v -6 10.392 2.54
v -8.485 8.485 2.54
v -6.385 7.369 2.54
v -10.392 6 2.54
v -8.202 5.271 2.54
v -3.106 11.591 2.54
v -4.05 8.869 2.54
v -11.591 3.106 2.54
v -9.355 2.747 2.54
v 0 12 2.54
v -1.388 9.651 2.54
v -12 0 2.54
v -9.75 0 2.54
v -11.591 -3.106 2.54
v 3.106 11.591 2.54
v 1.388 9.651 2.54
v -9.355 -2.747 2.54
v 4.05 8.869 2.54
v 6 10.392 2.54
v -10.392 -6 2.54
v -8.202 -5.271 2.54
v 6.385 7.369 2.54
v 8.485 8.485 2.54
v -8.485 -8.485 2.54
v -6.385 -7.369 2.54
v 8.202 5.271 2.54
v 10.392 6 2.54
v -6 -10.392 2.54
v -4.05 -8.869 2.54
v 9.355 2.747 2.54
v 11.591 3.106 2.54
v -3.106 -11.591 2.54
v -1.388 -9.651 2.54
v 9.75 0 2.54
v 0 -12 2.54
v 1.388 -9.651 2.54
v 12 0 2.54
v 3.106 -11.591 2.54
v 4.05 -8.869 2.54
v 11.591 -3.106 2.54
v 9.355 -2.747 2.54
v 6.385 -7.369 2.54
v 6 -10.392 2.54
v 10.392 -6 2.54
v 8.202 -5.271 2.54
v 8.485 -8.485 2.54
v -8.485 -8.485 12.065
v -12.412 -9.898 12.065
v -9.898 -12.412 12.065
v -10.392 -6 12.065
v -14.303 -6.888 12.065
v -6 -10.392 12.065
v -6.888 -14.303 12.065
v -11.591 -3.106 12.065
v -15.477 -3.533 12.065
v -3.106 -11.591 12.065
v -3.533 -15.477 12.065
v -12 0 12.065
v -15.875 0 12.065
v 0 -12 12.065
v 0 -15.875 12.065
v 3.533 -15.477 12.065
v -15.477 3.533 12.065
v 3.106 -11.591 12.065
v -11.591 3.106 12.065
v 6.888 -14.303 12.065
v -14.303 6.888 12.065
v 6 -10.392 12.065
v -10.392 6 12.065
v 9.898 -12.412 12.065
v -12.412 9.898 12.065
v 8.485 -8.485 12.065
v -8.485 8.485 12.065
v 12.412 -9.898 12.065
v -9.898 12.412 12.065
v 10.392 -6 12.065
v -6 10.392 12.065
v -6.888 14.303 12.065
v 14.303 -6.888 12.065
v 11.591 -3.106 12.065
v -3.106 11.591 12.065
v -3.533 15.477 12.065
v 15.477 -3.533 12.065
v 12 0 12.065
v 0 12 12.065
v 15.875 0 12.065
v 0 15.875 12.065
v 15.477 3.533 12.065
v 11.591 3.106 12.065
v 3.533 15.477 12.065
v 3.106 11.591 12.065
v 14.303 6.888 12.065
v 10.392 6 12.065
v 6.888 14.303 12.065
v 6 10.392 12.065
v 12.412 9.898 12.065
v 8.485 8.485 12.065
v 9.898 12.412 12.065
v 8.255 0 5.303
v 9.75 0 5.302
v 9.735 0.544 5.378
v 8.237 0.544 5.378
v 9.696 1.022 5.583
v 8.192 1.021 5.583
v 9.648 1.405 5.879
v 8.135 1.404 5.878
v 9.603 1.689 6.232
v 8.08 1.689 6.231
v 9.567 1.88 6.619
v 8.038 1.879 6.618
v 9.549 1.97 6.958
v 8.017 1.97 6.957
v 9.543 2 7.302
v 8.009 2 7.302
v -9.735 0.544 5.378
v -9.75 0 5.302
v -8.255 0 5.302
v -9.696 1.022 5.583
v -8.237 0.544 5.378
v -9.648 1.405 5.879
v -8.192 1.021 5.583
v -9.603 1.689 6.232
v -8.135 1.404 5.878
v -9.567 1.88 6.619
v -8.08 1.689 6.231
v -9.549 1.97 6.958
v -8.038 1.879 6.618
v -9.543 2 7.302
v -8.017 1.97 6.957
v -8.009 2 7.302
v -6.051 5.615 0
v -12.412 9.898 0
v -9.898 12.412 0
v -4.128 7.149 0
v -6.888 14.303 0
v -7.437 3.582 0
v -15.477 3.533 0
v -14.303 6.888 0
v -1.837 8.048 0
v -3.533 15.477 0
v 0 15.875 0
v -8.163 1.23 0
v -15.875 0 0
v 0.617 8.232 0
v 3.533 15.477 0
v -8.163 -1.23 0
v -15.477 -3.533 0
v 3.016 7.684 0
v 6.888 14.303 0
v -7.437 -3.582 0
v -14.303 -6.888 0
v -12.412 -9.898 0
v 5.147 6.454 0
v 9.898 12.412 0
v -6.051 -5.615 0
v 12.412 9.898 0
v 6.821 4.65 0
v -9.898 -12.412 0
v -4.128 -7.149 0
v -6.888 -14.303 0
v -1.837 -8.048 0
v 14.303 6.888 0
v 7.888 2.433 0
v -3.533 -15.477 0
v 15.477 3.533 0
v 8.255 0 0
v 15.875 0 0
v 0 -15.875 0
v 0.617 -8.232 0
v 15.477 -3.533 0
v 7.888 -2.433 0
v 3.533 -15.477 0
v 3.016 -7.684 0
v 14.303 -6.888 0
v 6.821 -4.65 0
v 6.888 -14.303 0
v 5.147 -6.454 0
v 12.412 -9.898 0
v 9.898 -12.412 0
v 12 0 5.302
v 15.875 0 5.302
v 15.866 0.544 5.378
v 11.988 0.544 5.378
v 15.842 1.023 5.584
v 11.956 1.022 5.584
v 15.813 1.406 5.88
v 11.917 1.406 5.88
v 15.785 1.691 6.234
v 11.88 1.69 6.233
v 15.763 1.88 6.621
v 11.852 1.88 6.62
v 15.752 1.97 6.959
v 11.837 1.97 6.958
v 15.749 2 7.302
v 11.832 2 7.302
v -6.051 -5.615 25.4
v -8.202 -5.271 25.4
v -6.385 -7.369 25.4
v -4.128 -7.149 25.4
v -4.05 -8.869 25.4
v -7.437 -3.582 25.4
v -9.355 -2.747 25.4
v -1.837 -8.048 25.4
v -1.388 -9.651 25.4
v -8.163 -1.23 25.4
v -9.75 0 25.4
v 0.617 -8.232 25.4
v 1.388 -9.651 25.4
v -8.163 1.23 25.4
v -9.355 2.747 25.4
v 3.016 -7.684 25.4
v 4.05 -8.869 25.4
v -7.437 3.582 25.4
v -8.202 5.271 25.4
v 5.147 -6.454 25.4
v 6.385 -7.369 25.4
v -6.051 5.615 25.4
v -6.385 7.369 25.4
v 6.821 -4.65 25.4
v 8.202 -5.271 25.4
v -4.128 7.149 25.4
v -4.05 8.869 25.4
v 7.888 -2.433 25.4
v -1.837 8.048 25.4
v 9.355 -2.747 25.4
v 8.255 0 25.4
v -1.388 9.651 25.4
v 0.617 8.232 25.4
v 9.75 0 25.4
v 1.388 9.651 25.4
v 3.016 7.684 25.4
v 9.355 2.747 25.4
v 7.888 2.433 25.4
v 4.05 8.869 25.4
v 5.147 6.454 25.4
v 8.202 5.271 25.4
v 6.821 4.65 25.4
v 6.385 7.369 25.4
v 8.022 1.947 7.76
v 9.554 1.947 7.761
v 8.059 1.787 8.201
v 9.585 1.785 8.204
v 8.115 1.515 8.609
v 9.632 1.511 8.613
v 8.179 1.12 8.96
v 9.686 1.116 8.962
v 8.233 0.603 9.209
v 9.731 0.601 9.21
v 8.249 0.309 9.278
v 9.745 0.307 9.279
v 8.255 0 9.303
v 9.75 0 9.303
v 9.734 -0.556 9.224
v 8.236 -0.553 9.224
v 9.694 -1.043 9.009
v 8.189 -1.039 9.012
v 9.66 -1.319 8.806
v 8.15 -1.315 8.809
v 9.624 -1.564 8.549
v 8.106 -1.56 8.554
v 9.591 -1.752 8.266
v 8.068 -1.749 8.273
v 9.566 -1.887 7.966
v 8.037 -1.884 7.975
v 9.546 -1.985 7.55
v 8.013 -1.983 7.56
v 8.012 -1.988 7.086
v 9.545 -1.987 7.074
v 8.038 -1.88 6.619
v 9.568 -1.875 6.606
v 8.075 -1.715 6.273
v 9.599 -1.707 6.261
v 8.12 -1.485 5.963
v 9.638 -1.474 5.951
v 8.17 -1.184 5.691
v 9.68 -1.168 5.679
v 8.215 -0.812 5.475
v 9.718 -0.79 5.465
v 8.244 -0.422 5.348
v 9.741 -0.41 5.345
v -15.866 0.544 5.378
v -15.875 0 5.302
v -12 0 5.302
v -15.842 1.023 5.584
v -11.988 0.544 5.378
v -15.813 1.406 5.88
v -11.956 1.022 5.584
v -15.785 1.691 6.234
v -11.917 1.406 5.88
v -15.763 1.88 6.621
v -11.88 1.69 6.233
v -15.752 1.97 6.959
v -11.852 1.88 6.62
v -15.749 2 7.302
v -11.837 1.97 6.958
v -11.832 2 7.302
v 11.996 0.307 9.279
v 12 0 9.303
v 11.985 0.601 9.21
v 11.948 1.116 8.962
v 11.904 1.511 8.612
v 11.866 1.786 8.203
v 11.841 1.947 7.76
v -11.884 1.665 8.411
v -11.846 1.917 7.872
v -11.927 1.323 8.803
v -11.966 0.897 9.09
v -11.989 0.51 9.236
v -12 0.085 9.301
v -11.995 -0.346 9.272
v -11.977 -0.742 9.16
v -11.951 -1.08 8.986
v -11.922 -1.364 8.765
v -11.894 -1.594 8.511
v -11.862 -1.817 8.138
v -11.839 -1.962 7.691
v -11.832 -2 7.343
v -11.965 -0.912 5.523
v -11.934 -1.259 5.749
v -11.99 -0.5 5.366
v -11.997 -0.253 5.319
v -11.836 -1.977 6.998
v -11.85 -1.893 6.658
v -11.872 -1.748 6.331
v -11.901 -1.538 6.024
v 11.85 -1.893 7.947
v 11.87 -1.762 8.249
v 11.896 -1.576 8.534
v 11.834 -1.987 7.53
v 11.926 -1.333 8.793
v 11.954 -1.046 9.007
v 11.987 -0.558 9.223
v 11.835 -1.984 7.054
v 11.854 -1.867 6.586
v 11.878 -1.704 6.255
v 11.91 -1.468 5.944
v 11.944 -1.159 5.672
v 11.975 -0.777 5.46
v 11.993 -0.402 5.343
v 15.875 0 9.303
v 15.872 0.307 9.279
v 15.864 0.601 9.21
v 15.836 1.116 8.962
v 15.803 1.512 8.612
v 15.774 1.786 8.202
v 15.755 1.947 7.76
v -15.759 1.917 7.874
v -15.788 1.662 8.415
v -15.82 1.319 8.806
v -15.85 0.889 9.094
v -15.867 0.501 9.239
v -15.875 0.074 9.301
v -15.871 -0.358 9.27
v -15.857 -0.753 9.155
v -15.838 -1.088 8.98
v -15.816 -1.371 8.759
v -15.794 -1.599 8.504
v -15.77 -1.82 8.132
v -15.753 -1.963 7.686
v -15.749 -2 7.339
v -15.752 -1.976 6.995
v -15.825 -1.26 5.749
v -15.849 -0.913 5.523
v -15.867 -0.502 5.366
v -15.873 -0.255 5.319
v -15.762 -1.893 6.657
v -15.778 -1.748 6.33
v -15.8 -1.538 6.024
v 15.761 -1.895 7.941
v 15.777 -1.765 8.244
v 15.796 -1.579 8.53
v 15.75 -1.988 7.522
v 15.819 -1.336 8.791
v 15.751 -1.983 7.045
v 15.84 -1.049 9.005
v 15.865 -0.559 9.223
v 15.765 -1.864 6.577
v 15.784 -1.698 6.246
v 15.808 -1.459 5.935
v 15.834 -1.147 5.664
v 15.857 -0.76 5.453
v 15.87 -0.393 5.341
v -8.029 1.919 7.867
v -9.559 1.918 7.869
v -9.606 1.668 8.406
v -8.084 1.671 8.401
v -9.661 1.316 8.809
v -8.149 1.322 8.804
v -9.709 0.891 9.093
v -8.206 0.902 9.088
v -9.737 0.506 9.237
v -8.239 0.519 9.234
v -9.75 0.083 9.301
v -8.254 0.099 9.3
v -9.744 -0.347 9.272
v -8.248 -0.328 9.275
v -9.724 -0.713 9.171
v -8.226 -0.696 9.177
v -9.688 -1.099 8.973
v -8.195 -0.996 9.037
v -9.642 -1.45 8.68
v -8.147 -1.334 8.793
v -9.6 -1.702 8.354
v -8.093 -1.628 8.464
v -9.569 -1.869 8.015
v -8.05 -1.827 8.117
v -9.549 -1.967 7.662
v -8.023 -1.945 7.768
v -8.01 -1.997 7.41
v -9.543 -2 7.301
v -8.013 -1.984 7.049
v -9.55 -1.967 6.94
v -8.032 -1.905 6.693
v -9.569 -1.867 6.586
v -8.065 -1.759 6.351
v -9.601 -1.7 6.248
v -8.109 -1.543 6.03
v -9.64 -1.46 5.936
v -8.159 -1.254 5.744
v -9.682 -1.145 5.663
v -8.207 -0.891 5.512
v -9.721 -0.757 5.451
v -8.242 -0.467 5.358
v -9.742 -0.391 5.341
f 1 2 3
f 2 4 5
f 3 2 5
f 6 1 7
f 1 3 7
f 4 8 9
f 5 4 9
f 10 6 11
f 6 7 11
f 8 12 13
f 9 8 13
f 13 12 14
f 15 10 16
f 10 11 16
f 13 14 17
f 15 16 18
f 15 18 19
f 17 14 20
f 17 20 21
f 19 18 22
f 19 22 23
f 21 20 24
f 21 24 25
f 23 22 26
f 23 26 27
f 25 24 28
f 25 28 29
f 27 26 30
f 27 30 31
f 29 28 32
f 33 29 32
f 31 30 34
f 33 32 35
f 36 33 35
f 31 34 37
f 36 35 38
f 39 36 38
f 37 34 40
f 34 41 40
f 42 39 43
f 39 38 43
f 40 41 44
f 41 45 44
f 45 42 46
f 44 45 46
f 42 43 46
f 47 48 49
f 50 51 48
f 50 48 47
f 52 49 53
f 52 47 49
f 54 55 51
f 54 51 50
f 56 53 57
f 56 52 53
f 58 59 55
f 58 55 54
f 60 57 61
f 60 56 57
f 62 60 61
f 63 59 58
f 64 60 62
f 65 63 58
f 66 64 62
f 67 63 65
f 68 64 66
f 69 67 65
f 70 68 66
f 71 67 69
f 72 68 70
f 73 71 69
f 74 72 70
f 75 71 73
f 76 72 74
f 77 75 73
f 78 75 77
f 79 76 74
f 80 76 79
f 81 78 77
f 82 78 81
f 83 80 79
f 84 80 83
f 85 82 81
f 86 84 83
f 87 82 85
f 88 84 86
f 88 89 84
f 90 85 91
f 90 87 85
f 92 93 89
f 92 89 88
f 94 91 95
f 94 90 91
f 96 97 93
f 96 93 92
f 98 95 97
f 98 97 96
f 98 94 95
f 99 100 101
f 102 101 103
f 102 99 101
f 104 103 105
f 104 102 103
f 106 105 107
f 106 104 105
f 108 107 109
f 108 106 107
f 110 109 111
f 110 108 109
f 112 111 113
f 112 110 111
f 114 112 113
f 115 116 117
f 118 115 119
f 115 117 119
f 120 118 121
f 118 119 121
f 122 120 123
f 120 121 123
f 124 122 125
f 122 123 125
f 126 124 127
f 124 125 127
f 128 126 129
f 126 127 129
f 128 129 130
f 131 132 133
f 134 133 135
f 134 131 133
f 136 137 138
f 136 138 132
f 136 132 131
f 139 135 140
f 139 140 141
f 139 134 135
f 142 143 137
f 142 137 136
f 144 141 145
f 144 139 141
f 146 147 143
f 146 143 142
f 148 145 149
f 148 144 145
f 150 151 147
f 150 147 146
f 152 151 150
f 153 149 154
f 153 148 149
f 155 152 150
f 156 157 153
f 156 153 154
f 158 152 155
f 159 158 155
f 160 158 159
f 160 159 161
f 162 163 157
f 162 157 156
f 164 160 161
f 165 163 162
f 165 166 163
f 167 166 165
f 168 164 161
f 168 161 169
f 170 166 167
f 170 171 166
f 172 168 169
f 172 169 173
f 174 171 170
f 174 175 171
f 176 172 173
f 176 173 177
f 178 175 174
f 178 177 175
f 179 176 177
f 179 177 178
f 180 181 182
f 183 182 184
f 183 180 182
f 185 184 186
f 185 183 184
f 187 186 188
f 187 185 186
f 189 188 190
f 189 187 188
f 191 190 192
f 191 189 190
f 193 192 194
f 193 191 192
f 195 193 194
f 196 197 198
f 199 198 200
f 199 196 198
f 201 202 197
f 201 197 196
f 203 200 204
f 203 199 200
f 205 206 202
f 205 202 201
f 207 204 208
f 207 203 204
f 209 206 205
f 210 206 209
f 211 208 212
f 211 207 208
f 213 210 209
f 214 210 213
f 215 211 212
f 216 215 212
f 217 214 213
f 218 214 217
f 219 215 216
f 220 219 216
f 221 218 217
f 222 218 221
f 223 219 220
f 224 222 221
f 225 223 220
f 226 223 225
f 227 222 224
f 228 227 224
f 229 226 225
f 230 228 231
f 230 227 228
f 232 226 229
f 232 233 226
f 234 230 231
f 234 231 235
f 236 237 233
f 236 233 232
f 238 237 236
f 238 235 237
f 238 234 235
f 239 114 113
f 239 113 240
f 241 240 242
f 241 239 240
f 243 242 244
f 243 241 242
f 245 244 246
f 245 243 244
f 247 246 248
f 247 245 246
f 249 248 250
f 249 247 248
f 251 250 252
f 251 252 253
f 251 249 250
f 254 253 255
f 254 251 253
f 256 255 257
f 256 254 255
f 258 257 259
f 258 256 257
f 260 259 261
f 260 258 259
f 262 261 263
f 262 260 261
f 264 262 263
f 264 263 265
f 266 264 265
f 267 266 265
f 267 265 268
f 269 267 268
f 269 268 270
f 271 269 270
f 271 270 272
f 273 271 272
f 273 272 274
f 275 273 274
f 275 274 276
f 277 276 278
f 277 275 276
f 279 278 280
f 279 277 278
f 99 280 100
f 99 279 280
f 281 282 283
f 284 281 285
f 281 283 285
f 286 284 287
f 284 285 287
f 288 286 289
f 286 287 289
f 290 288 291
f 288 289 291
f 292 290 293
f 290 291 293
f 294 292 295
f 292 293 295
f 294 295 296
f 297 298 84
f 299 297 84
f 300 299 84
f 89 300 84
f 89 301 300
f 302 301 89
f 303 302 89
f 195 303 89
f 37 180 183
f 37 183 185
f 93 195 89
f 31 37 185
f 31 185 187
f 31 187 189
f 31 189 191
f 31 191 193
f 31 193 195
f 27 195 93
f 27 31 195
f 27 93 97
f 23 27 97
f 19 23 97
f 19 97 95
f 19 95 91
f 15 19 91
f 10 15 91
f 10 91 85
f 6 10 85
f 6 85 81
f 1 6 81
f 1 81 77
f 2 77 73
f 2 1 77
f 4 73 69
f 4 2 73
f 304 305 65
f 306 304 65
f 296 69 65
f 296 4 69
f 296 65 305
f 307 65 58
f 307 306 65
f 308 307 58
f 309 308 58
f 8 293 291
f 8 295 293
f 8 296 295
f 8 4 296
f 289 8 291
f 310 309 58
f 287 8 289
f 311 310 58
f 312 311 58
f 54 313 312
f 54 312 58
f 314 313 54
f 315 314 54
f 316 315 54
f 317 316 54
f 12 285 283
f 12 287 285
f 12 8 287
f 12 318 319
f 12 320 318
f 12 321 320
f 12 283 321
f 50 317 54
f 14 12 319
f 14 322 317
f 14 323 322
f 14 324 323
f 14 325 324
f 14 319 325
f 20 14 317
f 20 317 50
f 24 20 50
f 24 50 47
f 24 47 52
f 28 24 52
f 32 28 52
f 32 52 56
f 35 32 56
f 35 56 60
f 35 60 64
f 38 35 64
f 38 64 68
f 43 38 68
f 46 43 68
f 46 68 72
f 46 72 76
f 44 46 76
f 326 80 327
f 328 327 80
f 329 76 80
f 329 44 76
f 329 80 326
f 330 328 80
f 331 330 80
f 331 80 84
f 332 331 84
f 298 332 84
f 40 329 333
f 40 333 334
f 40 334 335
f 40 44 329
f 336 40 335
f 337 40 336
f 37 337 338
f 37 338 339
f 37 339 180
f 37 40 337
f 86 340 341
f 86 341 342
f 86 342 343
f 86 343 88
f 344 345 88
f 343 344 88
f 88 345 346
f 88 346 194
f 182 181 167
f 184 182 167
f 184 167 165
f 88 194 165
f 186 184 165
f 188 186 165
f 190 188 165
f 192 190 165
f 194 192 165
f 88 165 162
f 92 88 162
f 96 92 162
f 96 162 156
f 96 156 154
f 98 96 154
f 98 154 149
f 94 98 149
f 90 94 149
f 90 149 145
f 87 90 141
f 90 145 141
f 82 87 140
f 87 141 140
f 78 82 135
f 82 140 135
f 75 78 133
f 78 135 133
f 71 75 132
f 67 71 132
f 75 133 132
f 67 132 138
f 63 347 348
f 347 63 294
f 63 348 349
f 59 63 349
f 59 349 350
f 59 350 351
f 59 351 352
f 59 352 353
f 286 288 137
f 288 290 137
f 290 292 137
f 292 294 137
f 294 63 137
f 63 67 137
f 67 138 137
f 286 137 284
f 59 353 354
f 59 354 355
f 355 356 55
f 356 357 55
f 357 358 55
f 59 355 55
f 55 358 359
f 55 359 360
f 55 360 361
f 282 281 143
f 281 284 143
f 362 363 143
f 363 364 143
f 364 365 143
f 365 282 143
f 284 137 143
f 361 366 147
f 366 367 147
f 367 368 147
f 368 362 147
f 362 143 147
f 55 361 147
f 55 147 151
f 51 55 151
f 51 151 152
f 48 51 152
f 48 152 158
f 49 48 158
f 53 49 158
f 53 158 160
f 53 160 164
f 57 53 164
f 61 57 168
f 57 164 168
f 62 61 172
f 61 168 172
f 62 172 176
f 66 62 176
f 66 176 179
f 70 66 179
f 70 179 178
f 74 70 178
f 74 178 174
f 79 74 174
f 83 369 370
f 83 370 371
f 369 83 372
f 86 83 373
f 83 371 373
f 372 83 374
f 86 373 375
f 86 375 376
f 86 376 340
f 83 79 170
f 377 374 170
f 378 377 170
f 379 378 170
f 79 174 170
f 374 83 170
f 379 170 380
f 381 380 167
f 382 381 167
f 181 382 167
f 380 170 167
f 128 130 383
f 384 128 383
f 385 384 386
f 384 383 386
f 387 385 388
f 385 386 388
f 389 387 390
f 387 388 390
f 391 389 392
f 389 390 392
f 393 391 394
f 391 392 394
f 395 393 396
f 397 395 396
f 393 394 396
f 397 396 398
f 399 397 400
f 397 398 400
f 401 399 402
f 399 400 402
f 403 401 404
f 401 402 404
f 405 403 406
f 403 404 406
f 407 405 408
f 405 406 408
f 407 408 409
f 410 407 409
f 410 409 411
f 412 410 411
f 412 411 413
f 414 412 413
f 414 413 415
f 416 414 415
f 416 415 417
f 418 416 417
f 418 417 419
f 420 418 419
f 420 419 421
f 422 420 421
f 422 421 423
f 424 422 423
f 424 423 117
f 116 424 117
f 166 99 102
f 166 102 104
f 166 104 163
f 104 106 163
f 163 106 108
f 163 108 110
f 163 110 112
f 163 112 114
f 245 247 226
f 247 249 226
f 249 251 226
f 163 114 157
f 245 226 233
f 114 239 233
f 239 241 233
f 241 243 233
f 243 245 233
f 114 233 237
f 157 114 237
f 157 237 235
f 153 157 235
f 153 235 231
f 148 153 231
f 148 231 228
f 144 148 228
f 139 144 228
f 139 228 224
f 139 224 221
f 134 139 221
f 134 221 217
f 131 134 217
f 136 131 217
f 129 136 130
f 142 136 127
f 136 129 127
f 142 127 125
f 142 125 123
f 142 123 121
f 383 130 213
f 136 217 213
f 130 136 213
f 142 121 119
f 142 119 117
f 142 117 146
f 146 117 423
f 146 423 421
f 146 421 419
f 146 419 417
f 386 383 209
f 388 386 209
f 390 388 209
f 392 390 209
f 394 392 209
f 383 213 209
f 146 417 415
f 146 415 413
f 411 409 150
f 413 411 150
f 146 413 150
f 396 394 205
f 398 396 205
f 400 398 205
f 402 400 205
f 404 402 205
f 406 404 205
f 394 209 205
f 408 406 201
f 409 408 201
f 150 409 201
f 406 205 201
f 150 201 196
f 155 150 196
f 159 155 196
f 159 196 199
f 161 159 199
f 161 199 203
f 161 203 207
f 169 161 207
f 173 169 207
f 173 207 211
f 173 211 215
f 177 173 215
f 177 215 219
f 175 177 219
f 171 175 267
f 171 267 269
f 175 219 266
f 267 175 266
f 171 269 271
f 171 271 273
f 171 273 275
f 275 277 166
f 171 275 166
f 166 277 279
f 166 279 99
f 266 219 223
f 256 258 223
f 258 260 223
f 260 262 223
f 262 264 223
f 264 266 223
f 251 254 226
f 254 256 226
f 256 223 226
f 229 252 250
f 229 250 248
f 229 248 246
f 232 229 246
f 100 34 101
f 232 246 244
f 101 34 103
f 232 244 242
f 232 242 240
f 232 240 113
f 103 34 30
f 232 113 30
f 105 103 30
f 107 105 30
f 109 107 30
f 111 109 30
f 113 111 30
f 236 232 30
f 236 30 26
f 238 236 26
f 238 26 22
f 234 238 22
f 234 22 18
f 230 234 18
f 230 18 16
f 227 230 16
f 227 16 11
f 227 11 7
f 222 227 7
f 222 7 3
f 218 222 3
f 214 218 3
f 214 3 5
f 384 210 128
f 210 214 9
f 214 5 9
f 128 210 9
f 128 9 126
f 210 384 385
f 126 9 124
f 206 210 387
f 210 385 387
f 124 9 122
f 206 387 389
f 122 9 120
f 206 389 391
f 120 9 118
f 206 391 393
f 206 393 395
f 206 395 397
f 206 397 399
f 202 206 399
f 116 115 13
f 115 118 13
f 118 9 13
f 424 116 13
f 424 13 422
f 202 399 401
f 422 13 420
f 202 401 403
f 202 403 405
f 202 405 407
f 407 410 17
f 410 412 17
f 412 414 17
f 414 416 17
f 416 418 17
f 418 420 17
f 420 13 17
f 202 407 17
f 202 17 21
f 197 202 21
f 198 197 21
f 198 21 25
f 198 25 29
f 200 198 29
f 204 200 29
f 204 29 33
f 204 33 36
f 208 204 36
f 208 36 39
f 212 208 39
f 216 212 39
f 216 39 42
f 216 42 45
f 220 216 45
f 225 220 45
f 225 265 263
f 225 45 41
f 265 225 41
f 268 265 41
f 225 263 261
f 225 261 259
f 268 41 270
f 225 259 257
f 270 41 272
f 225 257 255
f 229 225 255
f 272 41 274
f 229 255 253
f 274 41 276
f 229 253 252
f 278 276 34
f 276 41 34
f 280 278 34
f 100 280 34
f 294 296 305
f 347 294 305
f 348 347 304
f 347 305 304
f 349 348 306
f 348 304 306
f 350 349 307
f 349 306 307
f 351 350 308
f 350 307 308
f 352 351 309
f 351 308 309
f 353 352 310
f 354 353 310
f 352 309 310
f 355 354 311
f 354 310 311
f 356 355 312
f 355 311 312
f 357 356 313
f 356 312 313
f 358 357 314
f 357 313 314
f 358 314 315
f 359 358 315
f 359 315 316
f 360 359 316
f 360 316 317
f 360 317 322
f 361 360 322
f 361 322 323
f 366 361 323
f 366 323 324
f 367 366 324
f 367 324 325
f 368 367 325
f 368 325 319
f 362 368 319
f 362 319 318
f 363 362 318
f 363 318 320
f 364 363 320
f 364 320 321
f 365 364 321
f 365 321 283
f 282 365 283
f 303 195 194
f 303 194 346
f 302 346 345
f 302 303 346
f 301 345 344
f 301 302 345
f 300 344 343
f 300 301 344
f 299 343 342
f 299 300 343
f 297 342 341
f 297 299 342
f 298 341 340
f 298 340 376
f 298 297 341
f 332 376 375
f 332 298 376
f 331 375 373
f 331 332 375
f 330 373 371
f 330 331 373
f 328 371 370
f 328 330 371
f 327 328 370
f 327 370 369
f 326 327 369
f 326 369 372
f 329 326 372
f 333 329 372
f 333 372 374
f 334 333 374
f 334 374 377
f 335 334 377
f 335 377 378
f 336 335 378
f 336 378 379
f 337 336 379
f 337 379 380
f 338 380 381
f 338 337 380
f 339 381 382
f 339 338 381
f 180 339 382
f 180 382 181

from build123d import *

# Parameters (mm, degrees)
F0_R          = 9.75
F1_DEPTH      = 25.4
F2_R          = 8.255
F3_DEPTH      = 25.4
F4_R          = 15.875
F4_R_2        = 9.75
F5_DEPTH      = 2.54
F6_R          = 15.875
F6_R_2        = 12
F7_DEPTH      = 9.525
F9_DEPTH      = 25.4
F9_DEPTH_BACK = 25.4


with BuildPart() as f1:
    # F0 (on Top) → F1 (new body)
    with BuildSketch(Plane.XY):
        Circle(F0_R)
    extrude(amount=F1_DEPTH)

    # F2 (on face) → F3 (cut)
    with BuildSketch(Plane.XY.offset(25.4)):
        Circle(F2_R)
    extrude(amount=-F3_DEPTH, mode=Mode.SUBTRACT)

    # F4 (on face) → F5 (join)
    with BuildSketch(Plane(origin=(0, 0, 0), x_dir=(1, 0, 0), z_dir=(0, 0, -1))):
        Circle(F4_R)
        Circle(F4_R_2, mode=Mode.SUBTRACT)
    extrude(amount=-F5_DEPTH)

    # F6 (on face) → F7 (join)
    with BuildSketch(Plane.XY.offset(2.54)):
        Circle(F6_R)
        Circle(F6_R_2, mode=Mode.SUBTRACT)
    extrude(amount=F7_DEPTH)

    # F8 (on Right) → F9 (cut, two sides)
    with BuildSketch(Plane.YZ) as f9_sk:
        with BuildLine():
            ThreePointArc((0, 5.3025), (1.4142135624, 5.8882864376), (2, 7.3025))
            ThreePointArc((2, 7.3025), (-1.4142135624, 8.7167135624), (0, 5.3025))
        make_face()
    extrude(amount=-F9_DEPTH, mode=Mode.SUBTRACT)
    extrude(f9_sk.sketch, amount=F9_DEPTH_BACK, mode=Mode.SUBTRACT)


solid = f1.part
